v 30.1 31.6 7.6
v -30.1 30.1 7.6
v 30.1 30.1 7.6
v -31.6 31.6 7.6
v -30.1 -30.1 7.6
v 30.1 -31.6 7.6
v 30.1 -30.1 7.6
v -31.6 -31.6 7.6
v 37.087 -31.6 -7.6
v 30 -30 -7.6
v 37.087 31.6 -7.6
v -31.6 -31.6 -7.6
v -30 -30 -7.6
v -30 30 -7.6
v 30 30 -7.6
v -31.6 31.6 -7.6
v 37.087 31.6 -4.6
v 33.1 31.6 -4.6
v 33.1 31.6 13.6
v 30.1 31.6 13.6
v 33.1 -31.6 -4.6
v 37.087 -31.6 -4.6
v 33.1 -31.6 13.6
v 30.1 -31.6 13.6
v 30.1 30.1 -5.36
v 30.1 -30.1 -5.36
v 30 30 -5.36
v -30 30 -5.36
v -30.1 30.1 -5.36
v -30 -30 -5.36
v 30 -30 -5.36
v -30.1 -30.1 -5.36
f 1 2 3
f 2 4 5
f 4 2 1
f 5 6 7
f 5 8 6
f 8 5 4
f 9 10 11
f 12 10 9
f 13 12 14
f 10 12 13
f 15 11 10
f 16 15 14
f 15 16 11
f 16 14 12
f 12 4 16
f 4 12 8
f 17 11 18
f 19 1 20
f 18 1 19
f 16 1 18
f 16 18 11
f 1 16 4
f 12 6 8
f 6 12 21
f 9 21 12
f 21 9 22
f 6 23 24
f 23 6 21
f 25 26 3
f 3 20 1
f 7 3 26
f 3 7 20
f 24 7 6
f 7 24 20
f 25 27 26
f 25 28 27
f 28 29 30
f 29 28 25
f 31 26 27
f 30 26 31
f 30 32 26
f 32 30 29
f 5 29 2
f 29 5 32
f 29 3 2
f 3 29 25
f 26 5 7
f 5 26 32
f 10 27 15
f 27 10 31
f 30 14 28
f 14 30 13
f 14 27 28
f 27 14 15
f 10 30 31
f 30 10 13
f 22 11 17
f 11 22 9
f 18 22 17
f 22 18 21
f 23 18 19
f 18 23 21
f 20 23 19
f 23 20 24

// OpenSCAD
//ledmatrix frame
//author: Ismael Salvador
//date: 13/07/2014

led_qty=1;
led_size=60.20;
led_height=60.20;
led_width=led_height*led_qty;
led_depth=9.20;

frame_thick=3;
frame_depth=led_depth+frame_thick*2;
frame_size=led_size + frame_thick;
frame_width=led_width + frame_thick;
frame_height=led_height + frame_thick;

screen_margin=0.2;

angle=15;

difference(){

//outer cube
cube([frame_height, frame_width, frame_depth], center=true);

//inner cube

translate([0,0,frame_thick])
cube([led_height, led_width, frame_depth*1.1], center=true);


//screen hole
//little bit smaller than inner
translate([0,0,-frame_thick])
cube([led_height-screen_margin, led_width-screen_margin, frame_depth*1.1], center=true);

}

stand_depth=frame_depth+6;
stand_height=sin(angle)*stand_depth;

//standoff front
translate([frame_size/2 + stand_height/2, 0, -frame_depth/2 + frame_thick/2 ])
cube([stand_height, frame_width, frame_thick], center=true);

//standoff base
translate([frame_height/2  - 1/2*frame_thick, -frame_width/2, -frame_depth/2])
cube([frame_thick, frame_width, stand_depth], center=false);
//bevel



//translate([0,0,15])
//cube([50,20,2], center=true)
//
//difference(){
//translate([0,20,15])
//cube([30,20,2], center=true);
//
//translate([-10,25,15])
//#cylinder(h = 5, r1 = 1, $fs = 0.1, center = true);
//
//translate([10,25,15])
//#cylinder(h = 5, r1 = 1, $fs = 0.1, center = true);


//}
